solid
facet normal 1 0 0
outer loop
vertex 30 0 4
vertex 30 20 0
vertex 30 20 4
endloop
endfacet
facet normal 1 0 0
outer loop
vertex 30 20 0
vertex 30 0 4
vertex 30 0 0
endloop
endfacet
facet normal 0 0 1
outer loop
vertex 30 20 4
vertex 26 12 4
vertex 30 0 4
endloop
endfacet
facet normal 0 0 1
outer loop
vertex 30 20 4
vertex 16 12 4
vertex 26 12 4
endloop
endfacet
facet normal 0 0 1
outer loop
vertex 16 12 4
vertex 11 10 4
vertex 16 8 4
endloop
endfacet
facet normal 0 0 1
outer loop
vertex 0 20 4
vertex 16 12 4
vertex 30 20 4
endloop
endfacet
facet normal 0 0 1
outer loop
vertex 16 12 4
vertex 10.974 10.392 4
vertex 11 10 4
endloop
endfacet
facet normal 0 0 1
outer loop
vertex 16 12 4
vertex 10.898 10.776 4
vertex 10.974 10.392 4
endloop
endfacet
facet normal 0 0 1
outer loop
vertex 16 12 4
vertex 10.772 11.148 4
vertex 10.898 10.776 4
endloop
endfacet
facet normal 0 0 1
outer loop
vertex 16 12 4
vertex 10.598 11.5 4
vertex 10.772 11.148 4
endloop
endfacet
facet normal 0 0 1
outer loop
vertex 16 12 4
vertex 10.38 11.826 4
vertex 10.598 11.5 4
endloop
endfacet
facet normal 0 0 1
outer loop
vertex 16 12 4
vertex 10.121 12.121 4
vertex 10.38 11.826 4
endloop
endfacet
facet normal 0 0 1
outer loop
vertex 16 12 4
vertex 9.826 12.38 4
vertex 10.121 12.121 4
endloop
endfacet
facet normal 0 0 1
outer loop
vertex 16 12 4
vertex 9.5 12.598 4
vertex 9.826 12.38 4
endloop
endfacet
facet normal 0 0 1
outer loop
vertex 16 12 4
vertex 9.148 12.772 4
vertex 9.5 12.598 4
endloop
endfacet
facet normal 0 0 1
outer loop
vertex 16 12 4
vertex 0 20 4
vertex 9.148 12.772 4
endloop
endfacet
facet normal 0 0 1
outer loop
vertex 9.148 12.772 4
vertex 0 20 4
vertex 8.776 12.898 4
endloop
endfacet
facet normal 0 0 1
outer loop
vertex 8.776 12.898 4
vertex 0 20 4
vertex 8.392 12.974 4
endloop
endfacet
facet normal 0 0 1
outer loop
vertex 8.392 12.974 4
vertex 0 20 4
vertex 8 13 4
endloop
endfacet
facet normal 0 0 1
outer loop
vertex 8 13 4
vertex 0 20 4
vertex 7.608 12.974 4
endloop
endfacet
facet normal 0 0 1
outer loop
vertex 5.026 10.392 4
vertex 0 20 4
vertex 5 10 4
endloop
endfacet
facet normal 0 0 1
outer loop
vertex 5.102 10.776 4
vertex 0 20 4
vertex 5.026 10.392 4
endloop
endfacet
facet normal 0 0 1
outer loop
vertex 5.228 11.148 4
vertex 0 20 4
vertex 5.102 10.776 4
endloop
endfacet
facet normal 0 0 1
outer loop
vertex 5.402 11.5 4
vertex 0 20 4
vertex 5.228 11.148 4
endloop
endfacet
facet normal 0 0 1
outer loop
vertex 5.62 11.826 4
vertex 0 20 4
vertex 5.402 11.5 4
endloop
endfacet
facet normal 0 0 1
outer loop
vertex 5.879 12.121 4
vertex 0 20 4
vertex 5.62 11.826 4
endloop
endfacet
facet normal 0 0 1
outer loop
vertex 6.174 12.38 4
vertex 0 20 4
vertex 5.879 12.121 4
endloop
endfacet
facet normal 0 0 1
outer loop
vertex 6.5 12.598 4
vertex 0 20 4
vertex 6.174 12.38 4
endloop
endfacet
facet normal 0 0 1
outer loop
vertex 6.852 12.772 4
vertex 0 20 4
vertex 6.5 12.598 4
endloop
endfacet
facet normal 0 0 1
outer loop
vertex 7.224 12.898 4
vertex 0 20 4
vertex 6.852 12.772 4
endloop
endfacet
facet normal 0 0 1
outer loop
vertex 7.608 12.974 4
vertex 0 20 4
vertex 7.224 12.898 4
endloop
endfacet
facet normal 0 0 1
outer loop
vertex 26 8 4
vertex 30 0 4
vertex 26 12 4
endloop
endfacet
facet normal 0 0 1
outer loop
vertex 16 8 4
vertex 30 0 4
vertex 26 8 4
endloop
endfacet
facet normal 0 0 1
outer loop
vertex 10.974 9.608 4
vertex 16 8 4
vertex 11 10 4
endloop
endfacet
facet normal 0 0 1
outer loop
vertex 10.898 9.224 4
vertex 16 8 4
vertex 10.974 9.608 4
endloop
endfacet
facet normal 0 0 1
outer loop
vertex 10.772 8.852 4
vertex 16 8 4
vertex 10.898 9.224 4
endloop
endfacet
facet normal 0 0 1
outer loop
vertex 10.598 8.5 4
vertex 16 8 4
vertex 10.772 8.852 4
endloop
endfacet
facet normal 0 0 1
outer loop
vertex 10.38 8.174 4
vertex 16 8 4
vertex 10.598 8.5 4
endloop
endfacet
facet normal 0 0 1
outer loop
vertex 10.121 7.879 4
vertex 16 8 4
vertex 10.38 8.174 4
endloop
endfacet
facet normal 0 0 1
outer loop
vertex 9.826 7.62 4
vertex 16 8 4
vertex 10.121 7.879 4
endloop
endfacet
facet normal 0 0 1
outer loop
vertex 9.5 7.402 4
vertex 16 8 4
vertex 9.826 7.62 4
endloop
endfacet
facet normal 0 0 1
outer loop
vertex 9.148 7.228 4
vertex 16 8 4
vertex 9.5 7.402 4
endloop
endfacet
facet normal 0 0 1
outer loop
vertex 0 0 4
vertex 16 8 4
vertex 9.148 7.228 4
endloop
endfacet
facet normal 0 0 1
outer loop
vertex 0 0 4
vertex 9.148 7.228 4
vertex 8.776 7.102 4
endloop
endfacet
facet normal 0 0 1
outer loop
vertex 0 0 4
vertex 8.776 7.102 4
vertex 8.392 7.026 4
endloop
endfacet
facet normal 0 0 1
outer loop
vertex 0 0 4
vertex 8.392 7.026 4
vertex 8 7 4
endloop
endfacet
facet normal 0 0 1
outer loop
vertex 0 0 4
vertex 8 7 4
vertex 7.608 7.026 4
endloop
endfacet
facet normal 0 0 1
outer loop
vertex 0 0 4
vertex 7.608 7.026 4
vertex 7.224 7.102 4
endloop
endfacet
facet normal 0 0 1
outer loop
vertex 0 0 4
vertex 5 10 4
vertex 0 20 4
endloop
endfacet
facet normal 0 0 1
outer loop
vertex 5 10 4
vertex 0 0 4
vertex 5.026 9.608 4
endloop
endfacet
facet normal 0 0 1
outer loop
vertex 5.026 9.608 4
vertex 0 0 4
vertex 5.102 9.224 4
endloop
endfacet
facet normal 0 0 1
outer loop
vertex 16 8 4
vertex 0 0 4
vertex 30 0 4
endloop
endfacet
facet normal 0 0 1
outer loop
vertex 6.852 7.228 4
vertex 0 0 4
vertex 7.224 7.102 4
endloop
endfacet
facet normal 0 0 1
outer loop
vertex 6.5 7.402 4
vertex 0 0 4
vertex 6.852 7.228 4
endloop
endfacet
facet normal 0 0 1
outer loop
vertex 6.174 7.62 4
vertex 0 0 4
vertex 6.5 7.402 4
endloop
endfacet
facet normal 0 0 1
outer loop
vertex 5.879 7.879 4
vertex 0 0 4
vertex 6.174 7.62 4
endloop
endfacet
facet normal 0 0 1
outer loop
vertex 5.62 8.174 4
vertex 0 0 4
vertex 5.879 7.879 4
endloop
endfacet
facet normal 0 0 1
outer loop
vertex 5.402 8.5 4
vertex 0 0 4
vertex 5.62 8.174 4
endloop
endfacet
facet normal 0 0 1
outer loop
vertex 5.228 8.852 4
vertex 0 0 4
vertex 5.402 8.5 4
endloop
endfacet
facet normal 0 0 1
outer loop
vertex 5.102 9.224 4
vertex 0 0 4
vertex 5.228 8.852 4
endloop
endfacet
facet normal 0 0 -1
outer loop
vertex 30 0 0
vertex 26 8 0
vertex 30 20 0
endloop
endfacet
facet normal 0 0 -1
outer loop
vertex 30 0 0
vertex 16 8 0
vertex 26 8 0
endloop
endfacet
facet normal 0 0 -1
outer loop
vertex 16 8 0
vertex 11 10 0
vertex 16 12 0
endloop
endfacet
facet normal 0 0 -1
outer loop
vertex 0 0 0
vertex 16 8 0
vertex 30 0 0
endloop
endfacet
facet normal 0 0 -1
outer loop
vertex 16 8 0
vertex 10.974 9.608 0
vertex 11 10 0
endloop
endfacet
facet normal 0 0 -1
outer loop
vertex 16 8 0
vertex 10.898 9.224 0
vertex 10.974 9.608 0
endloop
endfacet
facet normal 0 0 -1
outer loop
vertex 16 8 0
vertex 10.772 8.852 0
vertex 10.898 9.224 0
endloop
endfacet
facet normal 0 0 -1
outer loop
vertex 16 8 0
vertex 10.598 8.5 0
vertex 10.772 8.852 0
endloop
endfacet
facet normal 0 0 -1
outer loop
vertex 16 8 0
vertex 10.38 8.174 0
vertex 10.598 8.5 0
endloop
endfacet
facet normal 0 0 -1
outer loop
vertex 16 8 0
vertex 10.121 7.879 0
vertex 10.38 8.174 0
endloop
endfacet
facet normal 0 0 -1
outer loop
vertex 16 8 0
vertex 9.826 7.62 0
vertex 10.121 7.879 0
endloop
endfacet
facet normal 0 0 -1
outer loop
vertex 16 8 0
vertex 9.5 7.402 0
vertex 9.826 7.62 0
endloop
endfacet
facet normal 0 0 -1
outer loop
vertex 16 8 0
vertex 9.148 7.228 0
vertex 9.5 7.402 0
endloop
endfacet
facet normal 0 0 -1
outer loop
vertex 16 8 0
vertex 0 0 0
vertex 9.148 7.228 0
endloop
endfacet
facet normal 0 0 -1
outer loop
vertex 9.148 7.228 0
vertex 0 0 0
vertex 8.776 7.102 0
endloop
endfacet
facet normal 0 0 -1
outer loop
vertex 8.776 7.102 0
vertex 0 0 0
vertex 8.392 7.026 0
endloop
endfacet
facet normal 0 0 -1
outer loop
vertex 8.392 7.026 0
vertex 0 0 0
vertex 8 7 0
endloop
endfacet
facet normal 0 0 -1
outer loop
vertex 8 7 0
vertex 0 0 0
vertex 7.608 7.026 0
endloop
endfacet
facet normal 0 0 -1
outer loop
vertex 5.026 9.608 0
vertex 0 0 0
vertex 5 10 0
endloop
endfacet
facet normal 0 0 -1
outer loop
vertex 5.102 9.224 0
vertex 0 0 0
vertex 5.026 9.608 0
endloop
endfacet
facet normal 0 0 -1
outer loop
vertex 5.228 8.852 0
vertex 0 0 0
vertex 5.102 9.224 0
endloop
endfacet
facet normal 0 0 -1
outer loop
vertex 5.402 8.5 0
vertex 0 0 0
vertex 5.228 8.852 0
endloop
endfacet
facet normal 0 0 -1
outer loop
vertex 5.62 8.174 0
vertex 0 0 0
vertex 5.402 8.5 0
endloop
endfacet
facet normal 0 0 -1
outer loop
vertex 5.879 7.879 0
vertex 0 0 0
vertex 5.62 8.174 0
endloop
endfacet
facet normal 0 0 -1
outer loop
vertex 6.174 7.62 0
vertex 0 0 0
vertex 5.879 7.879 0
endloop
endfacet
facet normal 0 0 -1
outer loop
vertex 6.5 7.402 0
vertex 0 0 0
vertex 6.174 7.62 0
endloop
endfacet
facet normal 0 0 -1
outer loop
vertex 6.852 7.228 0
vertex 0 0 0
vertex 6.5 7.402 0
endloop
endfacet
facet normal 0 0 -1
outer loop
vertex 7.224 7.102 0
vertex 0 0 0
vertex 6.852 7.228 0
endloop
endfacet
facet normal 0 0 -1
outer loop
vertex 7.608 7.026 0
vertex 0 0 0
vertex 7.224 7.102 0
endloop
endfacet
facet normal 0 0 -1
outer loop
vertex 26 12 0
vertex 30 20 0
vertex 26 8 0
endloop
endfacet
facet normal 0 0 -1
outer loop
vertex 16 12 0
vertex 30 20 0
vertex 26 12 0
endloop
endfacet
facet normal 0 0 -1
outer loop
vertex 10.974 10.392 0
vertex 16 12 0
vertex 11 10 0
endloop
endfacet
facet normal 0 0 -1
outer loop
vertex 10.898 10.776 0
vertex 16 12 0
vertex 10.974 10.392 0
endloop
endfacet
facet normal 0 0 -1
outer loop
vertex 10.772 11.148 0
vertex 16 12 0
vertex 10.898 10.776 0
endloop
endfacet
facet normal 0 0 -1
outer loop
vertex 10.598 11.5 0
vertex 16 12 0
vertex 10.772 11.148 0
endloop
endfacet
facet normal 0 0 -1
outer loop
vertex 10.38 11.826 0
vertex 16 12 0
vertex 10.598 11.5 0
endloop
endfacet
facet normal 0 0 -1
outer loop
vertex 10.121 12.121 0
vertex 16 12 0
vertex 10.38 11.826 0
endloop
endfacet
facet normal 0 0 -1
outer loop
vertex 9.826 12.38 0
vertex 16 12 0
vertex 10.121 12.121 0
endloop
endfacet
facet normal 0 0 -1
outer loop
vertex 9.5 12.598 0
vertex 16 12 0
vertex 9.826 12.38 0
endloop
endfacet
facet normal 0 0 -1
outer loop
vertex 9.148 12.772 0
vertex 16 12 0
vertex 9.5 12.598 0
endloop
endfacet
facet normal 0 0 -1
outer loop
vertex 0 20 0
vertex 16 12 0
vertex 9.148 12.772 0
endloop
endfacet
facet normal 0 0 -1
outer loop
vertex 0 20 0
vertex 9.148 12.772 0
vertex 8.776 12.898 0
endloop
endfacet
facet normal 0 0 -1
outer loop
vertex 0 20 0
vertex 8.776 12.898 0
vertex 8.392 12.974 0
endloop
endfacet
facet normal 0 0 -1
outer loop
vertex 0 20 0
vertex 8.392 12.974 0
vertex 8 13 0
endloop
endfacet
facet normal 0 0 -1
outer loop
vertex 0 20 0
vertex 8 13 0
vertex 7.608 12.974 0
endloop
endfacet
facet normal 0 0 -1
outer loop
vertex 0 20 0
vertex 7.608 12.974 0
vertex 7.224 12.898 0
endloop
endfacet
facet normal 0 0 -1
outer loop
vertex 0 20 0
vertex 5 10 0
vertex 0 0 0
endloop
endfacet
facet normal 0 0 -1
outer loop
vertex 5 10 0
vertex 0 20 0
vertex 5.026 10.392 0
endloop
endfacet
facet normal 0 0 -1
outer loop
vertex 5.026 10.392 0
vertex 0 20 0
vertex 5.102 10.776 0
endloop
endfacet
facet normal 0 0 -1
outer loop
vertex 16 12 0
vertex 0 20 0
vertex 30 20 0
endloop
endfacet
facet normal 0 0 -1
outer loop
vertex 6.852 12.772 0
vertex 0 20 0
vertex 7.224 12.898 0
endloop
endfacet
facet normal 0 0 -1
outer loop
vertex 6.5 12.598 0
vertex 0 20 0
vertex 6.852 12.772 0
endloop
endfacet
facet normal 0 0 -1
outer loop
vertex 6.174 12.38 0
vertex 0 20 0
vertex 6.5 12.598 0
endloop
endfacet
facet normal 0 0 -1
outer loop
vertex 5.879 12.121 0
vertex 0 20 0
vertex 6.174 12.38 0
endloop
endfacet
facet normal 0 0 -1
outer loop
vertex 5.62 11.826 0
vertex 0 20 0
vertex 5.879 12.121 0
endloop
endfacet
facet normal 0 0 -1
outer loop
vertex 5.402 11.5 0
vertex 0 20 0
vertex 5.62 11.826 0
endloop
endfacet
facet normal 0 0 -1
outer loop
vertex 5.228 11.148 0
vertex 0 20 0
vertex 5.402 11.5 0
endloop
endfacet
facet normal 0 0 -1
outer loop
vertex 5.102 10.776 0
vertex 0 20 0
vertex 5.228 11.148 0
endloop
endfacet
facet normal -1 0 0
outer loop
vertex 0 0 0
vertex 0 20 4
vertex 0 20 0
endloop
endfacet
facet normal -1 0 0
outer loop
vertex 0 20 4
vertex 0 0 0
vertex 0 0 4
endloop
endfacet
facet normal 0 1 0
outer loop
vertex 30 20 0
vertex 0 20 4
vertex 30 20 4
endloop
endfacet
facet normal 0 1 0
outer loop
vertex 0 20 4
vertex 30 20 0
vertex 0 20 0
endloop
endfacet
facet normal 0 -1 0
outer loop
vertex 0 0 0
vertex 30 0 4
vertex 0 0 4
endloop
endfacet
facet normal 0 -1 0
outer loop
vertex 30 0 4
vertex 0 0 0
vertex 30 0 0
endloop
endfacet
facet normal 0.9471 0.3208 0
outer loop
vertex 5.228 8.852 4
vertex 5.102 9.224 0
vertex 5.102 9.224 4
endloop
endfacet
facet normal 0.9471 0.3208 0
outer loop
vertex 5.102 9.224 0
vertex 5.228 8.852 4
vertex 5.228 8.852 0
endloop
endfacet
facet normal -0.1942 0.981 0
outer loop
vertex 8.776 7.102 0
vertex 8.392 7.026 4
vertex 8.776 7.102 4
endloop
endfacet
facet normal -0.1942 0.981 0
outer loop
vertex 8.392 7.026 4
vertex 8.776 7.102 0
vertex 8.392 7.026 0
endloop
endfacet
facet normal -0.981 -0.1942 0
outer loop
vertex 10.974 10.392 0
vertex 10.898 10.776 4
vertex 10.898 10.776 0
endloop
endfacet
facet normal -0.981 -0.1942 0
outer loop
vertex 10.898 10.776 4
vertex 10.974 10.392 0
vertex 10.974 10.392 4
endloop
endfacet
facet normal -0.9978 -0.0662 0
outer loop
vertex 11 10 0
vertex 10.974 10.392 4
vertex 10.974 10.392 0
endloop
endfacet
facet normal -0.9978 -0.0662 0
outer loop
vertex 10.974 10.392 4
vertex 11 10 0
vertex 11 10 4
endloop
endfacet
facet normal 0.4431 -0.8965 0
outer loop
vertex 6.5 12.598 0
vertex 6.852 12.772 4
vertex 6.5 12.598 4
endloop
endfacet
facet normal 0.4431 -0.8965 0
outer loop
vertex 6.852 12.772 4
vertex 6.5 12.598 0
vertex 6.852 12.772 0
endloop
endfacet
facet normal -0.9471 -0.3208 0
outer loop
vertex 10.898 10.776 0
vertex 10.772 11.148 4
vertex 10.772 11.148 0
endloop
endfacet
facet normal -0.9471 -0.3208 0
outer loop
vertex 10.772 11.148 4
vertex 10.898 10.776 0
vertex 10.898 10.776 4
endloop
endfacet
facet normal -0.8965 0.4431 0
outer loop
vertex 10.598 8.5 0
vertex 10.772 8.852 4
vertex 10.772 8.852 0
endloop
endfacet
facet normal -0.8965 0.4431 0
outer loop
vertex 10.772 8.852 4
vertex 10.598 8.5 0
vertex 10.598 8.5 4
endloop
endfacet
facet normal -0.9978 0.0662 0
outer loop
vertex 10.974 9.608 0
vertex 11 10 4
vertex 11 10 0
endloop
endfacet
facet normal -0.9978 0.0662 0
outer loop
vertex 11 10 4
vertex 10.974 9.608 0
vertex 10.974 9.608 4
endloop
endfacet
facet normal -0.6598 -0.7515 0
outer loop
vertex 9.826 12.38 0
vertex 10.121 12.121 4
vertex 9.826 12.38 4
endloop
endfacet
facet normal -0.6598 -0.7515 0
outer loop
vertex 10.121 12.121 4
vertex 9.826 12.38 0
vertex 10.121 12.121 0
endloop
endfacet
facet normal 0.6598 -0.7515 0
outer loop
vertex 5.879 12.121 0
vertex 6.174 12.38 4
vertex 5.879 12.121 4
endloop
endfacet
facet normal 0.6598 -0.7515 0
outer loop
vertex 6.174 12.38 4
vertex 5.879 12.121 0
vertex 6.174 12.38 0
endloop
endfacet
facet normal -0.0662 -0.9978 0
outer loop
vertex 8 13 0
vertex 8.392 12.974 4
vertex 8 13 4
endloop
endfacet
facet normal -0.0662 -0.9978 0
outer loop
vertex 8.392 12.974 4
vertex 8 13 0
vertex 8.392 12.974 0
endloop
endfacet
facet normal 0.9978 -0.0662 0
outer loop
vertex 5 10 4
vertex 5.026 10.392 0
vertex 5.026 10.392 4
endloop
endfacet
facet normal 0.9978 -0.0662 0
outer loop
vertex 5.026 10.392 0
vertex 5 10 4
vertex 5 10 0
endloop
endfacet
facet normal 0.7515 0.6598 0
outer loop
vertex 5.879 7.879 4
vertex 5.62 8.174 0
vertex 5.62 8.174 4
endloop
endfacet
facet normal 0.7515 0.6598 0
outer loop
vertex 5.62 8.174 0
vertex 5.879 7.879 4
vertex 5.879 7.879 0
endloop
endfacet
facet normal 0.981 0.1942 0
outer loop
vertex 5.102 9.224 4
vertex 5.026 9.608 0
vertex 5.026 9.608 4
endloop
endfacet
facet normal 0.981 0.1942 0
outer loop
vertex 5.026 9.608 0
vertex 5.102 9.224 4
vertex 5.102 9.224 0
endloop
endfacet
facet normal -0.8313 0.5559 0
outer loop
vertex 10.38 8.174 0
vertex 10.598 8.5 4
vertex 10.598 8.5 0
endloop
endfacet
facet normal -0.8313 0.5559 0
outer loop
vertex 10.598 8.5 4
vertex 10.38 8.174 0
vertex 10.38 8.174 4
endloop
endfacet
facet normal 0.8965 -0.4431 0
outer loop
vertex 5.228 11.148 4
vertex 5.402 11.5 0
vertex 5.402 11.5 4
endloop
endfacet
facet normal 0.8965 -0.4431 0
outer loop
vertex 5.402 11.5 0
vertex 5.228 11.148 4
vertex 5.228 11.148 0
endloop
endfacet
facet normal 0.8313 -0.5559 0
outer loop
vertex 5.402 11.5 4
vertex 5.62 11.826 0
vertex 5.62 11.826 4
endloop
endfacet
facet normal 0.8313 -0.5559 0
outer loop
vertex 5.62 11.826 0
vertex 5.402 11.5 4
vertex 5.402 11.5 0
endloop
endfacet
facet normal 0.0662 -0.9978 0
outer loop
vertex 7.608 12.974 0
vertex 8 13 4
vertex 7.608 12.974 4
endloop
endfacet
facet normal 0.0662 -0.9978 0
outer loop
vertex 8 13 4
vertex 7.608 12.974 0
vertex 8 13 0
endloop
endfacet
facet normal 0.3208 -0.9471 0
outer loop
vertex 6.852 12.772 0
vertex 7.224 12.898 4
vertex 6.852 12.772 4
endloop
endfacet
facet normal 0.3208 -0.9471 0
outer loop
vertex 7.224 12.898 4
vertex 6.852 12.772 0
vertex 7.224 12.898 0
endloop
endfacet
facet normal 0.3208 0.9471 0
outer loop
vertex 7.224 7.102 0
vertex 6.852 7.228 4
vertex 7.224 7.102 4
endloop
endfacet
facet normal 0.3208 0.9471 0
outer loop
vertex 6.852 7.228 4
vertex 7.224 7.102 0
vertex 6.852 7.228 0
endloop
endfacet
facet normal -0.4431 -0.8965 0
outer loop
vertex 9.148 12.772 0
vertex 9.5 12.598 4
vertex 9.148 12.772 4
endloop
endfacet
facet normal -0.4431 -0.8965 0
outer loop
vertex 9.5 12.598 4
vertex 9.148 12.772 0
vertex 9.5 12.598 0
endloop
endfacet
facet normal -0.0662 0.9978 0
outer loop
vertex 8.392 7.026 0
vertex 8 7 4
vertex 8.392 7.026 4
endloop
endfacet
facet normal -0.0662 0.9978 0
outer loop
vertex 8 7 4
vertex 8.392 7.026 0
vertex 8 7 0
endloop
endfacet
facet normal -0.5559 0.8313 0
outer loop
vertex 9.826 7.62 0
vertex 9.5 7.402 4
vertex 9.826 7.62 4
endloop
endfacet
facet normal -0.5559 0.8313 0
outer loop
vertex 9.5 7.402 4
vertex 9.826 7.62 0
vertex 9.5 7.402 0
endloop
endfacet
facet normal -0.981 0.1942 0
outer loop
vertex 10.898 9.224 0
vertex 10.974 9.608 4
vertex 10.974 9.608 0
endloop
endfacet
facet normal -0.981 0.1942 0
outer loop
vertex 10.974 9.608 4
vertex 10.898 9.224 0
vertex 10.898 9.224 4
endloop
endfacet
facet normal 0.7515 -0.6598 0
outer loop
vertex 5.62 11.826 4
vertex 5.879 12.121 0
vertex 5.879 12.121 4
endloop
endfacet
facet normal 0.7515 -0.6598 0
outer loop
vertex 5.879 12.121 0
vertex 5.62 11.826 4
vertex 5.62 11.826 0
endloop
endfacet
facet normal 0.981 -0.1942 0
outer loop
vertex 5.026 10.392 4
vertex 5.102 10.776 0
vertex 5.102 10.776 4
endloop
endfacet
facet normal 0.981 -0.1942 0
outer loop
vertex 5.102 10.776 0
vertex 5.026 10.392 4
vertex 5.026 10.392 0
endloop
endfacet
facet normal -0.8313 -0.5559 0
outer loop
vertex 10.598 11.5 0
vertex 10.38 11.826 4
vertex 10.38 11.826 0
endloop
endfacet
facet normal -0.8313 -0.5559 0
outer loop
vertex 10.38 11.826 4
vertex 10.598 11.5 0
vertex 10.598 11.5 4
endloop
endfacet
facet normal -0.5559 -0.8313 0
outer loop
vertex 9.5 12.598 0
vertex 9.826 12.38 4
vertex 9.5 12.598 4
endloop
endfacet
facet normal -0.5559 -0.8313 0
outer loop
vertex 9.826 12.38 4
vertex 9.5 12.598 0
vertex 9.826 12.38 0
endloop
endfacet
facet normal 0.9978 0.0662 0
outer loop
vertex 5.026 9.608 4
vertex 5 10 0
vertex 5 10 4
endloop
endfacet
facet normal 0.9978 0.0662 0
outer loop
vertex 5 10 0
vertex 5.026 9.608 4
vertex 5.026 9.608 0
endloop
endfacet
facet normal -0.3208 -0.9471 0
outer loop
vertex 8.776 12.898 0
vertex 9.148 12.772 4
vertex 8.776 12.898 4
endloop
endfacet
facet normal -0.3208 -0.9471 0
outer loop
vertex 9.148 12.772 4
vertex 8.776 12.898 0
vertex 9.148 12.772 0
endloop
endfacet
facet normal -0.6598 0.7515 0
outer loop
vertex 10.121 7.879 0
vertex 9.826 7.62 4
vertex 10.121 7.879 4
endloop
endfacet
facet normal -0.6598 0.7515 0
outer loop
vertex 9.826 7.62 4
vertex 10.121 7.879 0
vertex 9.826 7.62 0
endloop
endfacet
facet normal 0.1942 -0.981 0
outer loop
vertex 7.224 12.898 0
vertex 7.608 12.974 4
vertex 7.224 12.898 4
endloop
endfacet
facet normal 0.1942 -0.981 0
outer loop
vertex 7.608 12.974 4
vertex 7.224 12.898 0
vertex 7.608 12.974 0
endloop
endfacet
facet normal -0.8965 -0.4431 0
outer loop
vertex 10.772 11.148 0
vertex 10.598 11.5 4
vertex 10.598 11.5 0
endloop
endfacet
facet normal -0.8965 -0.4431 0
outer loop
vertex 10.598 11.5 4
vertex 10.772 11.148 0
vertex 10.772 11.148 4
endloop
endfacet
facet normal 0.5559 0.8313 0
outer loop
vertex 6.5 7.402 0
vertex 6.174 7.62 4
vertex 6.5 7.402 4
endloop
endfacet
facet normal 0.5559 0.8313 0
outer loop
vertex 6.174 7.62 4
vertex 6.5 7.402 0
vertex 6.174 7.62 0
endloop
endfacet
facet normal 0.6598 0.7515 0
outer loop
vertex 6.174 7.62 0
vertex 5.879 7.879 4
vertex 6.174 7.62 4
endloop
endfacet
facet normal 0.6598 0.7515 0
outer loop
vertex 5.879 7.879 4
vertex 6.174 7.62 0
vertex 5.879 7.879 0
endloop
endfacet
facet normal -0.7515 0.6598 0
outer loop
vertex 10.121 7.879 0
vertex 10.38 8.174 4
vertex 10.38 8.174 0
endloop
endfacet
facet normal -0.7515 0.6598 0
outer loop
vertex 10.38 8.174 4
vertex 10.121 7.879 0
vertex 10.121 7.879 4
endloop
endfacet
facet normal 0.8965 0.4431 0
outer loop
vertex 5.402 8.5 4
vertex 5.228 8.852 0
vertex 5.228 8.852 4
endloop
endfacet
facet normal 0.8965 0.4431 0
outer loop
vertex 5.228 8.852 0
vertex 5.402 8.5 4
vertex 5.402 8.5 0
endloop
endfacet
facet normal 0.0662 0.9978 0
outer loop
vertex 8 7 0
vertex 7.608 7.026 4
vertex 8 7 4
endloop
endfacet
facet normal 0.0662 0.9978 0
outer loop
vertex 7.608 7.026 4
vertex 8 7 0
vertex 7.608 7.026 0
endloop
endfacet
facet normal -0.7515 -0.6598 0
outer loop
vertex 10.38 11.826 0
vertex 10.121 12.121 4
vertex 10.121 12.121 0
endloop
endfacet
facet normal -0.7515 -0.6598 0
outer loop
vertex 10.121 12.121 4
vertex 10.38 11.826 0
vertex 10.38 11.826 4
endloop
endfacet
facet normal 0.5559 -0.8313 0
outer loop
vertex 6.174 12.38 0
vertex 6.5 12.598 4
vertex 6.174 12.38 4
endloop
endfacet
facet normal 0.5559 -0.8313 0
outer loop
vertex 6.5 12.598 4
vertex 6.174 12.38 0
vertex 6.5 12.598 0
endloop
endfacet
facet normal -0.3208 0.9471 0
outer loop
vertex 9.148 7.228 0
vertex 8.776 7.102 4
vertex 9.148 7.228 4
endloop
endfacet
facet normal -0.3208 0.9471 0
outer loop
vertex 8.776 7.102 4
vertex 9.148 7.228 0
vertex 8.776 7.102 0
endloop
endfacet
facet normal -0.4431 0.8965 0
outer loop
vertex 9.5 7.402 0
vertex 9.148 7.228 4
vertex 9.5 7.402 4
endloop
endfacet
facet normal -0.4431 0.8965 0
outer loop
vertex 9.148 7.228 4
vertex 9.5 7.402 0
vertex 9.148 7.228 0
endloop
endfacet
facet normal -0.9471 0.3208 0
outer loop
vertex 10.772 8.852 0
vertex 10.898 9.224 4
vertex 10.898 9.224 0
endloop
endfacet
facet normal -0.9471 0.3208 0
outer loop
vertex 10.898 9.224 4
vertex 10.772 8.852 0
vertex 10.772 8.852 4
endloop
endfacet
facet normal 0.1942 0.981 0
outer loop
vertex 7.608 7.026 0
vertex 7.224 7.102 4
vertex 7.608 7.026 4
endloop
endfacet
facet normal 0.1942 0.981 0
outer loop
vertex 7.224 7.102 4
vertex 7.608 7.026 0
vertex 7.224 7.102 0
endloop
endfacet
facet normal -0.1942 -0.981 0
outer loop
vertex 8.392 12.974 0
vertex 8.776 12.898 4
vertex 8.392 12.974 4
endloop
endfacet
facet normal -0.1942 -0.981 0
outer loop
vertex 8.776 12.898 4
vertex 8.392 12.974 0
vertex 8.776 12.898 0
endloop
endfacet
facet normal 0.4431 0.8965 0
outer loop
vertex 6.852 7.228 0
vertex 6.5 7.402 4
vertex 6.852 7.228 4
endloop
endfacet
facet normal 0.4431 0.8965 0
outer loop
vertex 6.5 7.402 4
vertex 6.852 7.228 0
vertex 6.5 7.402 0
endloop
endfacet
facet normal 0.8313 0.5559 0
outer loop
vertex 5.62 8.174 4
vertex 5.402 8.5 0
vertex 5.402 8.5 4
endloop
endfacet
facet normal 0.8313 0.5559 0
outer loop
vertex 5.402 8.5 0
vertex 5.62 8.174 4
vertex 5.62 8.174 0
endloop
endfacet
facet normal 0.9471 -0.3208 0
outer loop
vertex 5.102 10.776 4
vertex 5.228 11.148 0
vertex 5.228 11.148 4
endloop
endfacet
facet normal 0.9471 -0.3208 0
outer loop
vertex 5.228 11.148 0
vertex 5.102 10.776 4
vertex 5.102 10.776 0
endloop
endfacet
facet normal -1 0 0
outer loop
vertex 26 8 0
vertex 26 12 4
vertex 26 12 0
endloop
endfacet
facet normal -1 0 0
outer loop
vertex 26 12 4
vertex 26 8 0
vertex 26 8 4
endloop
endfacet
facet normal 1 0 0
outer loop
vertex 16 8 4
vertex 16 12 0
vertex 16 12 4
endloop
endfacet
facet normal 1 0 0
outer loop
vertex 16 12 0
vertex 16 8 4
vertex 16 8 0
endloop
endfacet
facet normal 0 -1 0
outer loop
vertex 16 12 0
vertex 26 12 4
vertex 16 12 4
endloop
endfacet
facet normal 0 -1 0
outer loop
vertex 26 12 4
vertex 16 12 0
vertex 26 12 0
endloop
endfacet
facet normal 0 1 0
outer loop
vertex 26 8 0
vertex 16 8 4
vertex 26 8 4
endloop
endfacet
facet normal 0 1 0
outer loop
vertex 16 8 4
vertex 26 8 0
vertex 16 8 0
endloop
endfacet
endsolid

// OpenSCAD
// Original CanvasNet test fixture: a flat plate with a round through hole and a rectangular slot.
// The plate covers x 0..30, y 0..20 and is 4 thick; the hole is centered at (8, 10) and the slot spans
// x 16..26, y 8..12. Both cutters stick out of the plate on both sides, so the holes go all the way through.
plate_width = 30;
plate_depth = 20;
plate_thickness = 4;

difference() {
  cube([plate_width, plate_depth, plate_thickness]);
  translate([8, 10, -1]) cylinder(r = 3, h = plate_thickness + 2, $fn = 48);
  translate([16, 8, -1]) cube([10, 4, plate_thickness + 2]);
}
